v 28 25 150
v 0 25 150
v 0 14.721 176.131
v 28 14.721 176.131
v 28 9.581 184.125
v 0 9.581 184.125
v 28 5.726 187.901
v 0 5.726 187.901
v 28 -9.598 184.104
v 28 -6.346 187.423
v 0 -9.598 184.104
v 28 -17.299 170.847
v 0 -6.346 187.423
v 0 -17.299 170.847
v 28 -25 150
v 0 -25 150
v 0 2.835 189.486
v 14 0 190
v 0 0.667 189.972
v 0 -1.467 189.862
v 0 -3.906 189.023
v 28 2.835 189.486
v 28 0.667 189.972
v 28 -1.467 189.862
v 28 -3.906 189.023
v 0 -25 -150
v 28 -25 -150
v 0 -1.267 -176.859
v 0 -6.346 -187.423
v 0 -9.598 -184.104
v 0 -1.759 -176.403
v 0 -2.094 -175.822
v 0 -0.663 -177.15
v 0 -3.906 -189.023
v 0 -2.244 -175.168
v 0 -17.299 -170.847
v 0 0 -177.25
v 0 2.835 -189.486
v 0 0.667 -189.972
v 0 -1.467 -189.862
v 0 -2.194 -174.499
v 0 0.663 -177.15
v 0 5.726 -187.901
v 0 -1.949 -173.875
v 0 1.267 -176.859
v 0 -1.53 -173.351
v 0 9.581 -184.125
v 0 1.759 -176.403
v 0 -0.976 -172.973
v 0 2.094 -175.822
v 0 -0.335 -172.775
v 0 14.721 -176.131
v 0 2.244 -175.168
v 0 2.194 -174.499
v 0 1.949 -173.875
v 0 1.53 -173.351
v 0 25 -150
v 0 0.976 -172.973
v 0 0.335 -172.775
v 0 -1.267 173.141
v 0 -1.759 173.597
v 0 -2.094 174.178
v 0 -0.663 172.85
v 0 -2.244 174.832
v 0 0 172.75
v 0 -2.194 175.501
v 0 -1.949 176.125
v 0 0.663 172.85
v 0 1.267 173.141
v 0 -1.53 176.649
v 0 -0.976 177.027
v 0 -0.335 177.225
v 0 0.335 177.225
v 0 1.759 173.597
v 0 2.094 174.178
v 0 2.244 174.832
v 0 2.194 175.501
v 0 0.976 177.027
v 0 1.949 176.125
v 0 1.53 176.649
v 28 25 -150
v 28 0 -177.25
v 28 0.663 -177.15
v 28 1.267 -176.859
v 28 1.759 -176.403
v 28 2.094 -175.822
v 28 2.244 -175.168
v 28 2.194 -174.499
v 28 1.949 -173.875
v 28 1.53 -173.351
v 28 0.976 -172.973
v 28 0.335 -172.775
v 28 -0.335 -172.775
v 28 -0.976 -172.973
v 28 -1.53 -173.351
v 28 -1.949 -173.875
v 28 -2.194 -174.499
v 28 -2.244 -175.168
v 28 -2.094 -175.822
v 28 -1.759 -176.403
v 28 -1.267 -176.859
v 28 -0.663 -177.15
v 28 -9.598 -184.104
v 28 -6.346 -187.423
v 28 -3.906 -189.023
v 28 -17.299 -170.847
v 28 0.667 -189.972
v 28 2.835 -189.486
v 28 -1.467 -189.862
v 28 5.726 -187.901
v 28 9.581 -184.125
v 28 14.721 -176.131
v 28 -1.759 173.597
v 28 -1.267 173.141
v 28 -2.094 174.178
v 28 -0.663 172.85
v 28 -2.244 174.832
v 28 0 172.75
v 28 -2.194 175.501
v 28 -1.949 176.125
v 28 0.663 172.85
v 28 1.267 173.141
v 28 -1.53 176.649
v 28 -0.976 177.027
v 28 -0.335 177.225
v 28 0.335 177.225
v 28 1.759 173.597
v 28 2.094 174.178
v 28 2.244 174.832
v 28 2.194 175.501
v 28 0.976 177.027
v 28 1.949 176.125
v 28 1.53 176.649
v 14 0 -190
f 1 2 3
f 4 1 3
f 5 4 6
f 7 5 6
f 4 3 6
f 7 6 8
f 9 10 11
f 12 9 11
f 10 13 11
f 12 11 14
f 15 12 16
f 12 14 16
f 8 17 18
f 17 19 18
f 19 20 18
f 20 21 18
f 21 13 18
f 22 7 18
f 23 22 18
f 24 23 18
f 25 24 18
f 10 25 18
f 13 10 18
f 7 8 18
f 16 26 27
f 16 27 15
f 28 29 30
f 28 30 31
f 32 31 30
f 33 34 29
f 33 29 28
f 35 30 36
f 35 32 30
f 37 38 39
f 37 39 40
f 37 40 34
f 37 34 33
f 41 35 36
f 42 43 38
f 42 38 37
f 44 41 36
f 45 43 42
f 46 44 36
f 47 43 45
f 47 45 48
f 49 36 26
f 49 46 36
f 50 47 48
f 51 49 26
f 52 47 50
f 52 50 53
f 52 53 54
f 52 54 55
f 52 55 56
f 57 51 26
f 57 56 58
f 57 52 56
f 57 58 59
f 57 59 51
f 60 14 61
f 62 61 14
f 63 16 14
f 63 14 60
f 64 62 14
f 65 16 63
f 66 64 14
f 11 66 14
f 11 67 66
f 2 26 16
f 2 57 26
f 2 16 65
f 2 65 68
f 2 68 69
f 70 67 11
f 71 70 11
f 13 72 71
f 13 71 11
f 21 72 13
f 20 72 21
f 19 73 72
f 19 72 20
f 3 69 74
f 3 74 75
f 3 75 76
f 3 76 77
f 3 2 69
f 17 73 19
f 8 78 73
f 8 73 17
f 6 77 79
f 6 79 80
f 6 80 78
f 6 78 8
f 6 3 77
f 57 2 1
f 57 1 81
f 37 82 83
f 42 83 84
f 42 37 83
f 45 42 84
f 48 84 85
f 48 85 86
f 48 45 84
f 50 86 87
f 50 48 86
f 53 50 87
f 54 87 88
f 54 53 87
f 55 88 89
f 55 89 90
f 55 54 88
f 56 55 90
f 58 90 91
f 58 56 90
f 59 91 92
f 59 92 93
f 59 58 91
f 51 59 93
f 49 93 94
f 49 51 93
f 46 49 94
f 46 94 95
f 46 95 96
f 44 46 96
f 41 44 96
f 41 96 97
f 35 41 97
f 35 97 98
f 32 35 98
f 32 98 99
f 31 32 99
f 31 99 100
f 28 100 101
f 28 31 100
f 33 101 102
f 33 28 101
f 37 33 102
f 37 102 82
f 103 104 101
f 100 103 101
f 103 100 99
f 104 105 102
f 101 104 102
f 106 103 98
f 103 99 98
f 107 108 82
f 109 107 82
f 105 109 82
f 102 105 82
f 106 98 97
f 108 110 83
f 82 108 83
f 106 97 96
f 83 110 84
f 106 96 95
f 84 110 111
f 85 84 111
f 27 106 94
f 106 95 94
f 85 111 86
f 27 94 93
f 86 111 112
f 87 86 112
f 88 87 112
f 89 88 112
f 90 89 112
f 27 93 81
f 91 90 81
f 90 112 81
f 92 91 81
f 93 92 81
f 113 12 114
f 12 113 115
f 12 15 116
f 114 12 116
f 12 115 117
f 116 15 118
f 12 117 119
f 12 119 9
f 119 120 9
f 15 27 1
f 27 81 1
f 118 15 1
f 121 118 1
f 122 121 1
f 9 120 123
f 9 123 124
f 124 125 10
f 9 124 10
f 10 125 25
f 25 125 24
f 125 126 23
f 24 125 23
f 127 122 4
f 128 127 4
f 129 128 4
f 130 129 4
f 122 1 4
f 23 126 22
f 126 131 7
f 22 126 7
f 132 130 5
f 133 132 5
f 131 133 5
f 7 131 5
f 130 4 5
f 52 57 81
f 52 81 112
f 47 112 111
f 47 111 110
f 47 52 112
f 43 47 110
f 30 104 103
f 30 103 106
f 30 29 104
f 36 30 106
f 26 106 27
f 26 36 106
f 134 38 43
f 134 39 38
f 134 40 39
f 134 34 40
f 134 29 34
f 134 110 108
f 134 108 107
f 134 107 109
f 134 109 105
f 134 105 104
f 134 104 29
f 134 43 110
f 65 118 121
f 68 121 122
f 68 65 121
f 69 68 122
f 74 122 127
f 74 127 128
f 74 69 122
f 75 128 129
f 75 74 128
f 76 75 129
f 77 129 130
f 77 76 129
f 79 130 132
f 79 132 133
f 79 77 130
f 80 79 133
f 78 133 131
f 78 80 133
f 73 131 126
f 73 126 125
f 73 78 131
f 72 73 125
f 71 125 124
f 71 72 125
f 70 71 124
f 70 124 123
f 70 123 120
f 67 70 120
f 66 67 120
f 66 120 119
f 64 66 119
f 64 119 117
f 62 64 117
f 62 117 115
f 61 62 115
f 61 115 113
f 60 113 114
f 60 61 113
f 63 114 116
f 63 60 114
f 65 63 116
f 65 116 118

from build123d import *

# Parameters (mm, degrees)
SKETCH1_R           = 2.25
BOSS_EXTRUDE1_DEPTH = 28


with BuildPart() as part:
    # Sketch1 → Boss-Extrude1 (new body)
    with BuildSketch(Plane(origin=(0, 0, 0), x_dir=(0, 0, -1), z_dir=(1, 0, 0))):
        with BuildLine():
            Line((-150, 25), (150, 25))
            add(Edge.make_bspline(
                [(150, 25), (230, 0), (150, -25)],
                knots=[0, 0, 0, 1, 1, 1], degree=2))
            Line((150, -25), (-150, -25))
            add(Edge.make_bspline(
                [(-150, 25), (-230, 0), (-150, -25)],
                knots=[0, 0, 0, 1, 1, 1], degree=2))
        make_face()
        with Locations((-175, 0)):
            Circle(SKETCH1_R, mode=Mode.SUBTRACT)
        with Locations((175, 0)):
            Circle(SKETCH1_R, mode=Mode.SUBTRACT)
    extrude(amount=BOSS_EXTRUDE1_DEPTH)


solid = part.part
